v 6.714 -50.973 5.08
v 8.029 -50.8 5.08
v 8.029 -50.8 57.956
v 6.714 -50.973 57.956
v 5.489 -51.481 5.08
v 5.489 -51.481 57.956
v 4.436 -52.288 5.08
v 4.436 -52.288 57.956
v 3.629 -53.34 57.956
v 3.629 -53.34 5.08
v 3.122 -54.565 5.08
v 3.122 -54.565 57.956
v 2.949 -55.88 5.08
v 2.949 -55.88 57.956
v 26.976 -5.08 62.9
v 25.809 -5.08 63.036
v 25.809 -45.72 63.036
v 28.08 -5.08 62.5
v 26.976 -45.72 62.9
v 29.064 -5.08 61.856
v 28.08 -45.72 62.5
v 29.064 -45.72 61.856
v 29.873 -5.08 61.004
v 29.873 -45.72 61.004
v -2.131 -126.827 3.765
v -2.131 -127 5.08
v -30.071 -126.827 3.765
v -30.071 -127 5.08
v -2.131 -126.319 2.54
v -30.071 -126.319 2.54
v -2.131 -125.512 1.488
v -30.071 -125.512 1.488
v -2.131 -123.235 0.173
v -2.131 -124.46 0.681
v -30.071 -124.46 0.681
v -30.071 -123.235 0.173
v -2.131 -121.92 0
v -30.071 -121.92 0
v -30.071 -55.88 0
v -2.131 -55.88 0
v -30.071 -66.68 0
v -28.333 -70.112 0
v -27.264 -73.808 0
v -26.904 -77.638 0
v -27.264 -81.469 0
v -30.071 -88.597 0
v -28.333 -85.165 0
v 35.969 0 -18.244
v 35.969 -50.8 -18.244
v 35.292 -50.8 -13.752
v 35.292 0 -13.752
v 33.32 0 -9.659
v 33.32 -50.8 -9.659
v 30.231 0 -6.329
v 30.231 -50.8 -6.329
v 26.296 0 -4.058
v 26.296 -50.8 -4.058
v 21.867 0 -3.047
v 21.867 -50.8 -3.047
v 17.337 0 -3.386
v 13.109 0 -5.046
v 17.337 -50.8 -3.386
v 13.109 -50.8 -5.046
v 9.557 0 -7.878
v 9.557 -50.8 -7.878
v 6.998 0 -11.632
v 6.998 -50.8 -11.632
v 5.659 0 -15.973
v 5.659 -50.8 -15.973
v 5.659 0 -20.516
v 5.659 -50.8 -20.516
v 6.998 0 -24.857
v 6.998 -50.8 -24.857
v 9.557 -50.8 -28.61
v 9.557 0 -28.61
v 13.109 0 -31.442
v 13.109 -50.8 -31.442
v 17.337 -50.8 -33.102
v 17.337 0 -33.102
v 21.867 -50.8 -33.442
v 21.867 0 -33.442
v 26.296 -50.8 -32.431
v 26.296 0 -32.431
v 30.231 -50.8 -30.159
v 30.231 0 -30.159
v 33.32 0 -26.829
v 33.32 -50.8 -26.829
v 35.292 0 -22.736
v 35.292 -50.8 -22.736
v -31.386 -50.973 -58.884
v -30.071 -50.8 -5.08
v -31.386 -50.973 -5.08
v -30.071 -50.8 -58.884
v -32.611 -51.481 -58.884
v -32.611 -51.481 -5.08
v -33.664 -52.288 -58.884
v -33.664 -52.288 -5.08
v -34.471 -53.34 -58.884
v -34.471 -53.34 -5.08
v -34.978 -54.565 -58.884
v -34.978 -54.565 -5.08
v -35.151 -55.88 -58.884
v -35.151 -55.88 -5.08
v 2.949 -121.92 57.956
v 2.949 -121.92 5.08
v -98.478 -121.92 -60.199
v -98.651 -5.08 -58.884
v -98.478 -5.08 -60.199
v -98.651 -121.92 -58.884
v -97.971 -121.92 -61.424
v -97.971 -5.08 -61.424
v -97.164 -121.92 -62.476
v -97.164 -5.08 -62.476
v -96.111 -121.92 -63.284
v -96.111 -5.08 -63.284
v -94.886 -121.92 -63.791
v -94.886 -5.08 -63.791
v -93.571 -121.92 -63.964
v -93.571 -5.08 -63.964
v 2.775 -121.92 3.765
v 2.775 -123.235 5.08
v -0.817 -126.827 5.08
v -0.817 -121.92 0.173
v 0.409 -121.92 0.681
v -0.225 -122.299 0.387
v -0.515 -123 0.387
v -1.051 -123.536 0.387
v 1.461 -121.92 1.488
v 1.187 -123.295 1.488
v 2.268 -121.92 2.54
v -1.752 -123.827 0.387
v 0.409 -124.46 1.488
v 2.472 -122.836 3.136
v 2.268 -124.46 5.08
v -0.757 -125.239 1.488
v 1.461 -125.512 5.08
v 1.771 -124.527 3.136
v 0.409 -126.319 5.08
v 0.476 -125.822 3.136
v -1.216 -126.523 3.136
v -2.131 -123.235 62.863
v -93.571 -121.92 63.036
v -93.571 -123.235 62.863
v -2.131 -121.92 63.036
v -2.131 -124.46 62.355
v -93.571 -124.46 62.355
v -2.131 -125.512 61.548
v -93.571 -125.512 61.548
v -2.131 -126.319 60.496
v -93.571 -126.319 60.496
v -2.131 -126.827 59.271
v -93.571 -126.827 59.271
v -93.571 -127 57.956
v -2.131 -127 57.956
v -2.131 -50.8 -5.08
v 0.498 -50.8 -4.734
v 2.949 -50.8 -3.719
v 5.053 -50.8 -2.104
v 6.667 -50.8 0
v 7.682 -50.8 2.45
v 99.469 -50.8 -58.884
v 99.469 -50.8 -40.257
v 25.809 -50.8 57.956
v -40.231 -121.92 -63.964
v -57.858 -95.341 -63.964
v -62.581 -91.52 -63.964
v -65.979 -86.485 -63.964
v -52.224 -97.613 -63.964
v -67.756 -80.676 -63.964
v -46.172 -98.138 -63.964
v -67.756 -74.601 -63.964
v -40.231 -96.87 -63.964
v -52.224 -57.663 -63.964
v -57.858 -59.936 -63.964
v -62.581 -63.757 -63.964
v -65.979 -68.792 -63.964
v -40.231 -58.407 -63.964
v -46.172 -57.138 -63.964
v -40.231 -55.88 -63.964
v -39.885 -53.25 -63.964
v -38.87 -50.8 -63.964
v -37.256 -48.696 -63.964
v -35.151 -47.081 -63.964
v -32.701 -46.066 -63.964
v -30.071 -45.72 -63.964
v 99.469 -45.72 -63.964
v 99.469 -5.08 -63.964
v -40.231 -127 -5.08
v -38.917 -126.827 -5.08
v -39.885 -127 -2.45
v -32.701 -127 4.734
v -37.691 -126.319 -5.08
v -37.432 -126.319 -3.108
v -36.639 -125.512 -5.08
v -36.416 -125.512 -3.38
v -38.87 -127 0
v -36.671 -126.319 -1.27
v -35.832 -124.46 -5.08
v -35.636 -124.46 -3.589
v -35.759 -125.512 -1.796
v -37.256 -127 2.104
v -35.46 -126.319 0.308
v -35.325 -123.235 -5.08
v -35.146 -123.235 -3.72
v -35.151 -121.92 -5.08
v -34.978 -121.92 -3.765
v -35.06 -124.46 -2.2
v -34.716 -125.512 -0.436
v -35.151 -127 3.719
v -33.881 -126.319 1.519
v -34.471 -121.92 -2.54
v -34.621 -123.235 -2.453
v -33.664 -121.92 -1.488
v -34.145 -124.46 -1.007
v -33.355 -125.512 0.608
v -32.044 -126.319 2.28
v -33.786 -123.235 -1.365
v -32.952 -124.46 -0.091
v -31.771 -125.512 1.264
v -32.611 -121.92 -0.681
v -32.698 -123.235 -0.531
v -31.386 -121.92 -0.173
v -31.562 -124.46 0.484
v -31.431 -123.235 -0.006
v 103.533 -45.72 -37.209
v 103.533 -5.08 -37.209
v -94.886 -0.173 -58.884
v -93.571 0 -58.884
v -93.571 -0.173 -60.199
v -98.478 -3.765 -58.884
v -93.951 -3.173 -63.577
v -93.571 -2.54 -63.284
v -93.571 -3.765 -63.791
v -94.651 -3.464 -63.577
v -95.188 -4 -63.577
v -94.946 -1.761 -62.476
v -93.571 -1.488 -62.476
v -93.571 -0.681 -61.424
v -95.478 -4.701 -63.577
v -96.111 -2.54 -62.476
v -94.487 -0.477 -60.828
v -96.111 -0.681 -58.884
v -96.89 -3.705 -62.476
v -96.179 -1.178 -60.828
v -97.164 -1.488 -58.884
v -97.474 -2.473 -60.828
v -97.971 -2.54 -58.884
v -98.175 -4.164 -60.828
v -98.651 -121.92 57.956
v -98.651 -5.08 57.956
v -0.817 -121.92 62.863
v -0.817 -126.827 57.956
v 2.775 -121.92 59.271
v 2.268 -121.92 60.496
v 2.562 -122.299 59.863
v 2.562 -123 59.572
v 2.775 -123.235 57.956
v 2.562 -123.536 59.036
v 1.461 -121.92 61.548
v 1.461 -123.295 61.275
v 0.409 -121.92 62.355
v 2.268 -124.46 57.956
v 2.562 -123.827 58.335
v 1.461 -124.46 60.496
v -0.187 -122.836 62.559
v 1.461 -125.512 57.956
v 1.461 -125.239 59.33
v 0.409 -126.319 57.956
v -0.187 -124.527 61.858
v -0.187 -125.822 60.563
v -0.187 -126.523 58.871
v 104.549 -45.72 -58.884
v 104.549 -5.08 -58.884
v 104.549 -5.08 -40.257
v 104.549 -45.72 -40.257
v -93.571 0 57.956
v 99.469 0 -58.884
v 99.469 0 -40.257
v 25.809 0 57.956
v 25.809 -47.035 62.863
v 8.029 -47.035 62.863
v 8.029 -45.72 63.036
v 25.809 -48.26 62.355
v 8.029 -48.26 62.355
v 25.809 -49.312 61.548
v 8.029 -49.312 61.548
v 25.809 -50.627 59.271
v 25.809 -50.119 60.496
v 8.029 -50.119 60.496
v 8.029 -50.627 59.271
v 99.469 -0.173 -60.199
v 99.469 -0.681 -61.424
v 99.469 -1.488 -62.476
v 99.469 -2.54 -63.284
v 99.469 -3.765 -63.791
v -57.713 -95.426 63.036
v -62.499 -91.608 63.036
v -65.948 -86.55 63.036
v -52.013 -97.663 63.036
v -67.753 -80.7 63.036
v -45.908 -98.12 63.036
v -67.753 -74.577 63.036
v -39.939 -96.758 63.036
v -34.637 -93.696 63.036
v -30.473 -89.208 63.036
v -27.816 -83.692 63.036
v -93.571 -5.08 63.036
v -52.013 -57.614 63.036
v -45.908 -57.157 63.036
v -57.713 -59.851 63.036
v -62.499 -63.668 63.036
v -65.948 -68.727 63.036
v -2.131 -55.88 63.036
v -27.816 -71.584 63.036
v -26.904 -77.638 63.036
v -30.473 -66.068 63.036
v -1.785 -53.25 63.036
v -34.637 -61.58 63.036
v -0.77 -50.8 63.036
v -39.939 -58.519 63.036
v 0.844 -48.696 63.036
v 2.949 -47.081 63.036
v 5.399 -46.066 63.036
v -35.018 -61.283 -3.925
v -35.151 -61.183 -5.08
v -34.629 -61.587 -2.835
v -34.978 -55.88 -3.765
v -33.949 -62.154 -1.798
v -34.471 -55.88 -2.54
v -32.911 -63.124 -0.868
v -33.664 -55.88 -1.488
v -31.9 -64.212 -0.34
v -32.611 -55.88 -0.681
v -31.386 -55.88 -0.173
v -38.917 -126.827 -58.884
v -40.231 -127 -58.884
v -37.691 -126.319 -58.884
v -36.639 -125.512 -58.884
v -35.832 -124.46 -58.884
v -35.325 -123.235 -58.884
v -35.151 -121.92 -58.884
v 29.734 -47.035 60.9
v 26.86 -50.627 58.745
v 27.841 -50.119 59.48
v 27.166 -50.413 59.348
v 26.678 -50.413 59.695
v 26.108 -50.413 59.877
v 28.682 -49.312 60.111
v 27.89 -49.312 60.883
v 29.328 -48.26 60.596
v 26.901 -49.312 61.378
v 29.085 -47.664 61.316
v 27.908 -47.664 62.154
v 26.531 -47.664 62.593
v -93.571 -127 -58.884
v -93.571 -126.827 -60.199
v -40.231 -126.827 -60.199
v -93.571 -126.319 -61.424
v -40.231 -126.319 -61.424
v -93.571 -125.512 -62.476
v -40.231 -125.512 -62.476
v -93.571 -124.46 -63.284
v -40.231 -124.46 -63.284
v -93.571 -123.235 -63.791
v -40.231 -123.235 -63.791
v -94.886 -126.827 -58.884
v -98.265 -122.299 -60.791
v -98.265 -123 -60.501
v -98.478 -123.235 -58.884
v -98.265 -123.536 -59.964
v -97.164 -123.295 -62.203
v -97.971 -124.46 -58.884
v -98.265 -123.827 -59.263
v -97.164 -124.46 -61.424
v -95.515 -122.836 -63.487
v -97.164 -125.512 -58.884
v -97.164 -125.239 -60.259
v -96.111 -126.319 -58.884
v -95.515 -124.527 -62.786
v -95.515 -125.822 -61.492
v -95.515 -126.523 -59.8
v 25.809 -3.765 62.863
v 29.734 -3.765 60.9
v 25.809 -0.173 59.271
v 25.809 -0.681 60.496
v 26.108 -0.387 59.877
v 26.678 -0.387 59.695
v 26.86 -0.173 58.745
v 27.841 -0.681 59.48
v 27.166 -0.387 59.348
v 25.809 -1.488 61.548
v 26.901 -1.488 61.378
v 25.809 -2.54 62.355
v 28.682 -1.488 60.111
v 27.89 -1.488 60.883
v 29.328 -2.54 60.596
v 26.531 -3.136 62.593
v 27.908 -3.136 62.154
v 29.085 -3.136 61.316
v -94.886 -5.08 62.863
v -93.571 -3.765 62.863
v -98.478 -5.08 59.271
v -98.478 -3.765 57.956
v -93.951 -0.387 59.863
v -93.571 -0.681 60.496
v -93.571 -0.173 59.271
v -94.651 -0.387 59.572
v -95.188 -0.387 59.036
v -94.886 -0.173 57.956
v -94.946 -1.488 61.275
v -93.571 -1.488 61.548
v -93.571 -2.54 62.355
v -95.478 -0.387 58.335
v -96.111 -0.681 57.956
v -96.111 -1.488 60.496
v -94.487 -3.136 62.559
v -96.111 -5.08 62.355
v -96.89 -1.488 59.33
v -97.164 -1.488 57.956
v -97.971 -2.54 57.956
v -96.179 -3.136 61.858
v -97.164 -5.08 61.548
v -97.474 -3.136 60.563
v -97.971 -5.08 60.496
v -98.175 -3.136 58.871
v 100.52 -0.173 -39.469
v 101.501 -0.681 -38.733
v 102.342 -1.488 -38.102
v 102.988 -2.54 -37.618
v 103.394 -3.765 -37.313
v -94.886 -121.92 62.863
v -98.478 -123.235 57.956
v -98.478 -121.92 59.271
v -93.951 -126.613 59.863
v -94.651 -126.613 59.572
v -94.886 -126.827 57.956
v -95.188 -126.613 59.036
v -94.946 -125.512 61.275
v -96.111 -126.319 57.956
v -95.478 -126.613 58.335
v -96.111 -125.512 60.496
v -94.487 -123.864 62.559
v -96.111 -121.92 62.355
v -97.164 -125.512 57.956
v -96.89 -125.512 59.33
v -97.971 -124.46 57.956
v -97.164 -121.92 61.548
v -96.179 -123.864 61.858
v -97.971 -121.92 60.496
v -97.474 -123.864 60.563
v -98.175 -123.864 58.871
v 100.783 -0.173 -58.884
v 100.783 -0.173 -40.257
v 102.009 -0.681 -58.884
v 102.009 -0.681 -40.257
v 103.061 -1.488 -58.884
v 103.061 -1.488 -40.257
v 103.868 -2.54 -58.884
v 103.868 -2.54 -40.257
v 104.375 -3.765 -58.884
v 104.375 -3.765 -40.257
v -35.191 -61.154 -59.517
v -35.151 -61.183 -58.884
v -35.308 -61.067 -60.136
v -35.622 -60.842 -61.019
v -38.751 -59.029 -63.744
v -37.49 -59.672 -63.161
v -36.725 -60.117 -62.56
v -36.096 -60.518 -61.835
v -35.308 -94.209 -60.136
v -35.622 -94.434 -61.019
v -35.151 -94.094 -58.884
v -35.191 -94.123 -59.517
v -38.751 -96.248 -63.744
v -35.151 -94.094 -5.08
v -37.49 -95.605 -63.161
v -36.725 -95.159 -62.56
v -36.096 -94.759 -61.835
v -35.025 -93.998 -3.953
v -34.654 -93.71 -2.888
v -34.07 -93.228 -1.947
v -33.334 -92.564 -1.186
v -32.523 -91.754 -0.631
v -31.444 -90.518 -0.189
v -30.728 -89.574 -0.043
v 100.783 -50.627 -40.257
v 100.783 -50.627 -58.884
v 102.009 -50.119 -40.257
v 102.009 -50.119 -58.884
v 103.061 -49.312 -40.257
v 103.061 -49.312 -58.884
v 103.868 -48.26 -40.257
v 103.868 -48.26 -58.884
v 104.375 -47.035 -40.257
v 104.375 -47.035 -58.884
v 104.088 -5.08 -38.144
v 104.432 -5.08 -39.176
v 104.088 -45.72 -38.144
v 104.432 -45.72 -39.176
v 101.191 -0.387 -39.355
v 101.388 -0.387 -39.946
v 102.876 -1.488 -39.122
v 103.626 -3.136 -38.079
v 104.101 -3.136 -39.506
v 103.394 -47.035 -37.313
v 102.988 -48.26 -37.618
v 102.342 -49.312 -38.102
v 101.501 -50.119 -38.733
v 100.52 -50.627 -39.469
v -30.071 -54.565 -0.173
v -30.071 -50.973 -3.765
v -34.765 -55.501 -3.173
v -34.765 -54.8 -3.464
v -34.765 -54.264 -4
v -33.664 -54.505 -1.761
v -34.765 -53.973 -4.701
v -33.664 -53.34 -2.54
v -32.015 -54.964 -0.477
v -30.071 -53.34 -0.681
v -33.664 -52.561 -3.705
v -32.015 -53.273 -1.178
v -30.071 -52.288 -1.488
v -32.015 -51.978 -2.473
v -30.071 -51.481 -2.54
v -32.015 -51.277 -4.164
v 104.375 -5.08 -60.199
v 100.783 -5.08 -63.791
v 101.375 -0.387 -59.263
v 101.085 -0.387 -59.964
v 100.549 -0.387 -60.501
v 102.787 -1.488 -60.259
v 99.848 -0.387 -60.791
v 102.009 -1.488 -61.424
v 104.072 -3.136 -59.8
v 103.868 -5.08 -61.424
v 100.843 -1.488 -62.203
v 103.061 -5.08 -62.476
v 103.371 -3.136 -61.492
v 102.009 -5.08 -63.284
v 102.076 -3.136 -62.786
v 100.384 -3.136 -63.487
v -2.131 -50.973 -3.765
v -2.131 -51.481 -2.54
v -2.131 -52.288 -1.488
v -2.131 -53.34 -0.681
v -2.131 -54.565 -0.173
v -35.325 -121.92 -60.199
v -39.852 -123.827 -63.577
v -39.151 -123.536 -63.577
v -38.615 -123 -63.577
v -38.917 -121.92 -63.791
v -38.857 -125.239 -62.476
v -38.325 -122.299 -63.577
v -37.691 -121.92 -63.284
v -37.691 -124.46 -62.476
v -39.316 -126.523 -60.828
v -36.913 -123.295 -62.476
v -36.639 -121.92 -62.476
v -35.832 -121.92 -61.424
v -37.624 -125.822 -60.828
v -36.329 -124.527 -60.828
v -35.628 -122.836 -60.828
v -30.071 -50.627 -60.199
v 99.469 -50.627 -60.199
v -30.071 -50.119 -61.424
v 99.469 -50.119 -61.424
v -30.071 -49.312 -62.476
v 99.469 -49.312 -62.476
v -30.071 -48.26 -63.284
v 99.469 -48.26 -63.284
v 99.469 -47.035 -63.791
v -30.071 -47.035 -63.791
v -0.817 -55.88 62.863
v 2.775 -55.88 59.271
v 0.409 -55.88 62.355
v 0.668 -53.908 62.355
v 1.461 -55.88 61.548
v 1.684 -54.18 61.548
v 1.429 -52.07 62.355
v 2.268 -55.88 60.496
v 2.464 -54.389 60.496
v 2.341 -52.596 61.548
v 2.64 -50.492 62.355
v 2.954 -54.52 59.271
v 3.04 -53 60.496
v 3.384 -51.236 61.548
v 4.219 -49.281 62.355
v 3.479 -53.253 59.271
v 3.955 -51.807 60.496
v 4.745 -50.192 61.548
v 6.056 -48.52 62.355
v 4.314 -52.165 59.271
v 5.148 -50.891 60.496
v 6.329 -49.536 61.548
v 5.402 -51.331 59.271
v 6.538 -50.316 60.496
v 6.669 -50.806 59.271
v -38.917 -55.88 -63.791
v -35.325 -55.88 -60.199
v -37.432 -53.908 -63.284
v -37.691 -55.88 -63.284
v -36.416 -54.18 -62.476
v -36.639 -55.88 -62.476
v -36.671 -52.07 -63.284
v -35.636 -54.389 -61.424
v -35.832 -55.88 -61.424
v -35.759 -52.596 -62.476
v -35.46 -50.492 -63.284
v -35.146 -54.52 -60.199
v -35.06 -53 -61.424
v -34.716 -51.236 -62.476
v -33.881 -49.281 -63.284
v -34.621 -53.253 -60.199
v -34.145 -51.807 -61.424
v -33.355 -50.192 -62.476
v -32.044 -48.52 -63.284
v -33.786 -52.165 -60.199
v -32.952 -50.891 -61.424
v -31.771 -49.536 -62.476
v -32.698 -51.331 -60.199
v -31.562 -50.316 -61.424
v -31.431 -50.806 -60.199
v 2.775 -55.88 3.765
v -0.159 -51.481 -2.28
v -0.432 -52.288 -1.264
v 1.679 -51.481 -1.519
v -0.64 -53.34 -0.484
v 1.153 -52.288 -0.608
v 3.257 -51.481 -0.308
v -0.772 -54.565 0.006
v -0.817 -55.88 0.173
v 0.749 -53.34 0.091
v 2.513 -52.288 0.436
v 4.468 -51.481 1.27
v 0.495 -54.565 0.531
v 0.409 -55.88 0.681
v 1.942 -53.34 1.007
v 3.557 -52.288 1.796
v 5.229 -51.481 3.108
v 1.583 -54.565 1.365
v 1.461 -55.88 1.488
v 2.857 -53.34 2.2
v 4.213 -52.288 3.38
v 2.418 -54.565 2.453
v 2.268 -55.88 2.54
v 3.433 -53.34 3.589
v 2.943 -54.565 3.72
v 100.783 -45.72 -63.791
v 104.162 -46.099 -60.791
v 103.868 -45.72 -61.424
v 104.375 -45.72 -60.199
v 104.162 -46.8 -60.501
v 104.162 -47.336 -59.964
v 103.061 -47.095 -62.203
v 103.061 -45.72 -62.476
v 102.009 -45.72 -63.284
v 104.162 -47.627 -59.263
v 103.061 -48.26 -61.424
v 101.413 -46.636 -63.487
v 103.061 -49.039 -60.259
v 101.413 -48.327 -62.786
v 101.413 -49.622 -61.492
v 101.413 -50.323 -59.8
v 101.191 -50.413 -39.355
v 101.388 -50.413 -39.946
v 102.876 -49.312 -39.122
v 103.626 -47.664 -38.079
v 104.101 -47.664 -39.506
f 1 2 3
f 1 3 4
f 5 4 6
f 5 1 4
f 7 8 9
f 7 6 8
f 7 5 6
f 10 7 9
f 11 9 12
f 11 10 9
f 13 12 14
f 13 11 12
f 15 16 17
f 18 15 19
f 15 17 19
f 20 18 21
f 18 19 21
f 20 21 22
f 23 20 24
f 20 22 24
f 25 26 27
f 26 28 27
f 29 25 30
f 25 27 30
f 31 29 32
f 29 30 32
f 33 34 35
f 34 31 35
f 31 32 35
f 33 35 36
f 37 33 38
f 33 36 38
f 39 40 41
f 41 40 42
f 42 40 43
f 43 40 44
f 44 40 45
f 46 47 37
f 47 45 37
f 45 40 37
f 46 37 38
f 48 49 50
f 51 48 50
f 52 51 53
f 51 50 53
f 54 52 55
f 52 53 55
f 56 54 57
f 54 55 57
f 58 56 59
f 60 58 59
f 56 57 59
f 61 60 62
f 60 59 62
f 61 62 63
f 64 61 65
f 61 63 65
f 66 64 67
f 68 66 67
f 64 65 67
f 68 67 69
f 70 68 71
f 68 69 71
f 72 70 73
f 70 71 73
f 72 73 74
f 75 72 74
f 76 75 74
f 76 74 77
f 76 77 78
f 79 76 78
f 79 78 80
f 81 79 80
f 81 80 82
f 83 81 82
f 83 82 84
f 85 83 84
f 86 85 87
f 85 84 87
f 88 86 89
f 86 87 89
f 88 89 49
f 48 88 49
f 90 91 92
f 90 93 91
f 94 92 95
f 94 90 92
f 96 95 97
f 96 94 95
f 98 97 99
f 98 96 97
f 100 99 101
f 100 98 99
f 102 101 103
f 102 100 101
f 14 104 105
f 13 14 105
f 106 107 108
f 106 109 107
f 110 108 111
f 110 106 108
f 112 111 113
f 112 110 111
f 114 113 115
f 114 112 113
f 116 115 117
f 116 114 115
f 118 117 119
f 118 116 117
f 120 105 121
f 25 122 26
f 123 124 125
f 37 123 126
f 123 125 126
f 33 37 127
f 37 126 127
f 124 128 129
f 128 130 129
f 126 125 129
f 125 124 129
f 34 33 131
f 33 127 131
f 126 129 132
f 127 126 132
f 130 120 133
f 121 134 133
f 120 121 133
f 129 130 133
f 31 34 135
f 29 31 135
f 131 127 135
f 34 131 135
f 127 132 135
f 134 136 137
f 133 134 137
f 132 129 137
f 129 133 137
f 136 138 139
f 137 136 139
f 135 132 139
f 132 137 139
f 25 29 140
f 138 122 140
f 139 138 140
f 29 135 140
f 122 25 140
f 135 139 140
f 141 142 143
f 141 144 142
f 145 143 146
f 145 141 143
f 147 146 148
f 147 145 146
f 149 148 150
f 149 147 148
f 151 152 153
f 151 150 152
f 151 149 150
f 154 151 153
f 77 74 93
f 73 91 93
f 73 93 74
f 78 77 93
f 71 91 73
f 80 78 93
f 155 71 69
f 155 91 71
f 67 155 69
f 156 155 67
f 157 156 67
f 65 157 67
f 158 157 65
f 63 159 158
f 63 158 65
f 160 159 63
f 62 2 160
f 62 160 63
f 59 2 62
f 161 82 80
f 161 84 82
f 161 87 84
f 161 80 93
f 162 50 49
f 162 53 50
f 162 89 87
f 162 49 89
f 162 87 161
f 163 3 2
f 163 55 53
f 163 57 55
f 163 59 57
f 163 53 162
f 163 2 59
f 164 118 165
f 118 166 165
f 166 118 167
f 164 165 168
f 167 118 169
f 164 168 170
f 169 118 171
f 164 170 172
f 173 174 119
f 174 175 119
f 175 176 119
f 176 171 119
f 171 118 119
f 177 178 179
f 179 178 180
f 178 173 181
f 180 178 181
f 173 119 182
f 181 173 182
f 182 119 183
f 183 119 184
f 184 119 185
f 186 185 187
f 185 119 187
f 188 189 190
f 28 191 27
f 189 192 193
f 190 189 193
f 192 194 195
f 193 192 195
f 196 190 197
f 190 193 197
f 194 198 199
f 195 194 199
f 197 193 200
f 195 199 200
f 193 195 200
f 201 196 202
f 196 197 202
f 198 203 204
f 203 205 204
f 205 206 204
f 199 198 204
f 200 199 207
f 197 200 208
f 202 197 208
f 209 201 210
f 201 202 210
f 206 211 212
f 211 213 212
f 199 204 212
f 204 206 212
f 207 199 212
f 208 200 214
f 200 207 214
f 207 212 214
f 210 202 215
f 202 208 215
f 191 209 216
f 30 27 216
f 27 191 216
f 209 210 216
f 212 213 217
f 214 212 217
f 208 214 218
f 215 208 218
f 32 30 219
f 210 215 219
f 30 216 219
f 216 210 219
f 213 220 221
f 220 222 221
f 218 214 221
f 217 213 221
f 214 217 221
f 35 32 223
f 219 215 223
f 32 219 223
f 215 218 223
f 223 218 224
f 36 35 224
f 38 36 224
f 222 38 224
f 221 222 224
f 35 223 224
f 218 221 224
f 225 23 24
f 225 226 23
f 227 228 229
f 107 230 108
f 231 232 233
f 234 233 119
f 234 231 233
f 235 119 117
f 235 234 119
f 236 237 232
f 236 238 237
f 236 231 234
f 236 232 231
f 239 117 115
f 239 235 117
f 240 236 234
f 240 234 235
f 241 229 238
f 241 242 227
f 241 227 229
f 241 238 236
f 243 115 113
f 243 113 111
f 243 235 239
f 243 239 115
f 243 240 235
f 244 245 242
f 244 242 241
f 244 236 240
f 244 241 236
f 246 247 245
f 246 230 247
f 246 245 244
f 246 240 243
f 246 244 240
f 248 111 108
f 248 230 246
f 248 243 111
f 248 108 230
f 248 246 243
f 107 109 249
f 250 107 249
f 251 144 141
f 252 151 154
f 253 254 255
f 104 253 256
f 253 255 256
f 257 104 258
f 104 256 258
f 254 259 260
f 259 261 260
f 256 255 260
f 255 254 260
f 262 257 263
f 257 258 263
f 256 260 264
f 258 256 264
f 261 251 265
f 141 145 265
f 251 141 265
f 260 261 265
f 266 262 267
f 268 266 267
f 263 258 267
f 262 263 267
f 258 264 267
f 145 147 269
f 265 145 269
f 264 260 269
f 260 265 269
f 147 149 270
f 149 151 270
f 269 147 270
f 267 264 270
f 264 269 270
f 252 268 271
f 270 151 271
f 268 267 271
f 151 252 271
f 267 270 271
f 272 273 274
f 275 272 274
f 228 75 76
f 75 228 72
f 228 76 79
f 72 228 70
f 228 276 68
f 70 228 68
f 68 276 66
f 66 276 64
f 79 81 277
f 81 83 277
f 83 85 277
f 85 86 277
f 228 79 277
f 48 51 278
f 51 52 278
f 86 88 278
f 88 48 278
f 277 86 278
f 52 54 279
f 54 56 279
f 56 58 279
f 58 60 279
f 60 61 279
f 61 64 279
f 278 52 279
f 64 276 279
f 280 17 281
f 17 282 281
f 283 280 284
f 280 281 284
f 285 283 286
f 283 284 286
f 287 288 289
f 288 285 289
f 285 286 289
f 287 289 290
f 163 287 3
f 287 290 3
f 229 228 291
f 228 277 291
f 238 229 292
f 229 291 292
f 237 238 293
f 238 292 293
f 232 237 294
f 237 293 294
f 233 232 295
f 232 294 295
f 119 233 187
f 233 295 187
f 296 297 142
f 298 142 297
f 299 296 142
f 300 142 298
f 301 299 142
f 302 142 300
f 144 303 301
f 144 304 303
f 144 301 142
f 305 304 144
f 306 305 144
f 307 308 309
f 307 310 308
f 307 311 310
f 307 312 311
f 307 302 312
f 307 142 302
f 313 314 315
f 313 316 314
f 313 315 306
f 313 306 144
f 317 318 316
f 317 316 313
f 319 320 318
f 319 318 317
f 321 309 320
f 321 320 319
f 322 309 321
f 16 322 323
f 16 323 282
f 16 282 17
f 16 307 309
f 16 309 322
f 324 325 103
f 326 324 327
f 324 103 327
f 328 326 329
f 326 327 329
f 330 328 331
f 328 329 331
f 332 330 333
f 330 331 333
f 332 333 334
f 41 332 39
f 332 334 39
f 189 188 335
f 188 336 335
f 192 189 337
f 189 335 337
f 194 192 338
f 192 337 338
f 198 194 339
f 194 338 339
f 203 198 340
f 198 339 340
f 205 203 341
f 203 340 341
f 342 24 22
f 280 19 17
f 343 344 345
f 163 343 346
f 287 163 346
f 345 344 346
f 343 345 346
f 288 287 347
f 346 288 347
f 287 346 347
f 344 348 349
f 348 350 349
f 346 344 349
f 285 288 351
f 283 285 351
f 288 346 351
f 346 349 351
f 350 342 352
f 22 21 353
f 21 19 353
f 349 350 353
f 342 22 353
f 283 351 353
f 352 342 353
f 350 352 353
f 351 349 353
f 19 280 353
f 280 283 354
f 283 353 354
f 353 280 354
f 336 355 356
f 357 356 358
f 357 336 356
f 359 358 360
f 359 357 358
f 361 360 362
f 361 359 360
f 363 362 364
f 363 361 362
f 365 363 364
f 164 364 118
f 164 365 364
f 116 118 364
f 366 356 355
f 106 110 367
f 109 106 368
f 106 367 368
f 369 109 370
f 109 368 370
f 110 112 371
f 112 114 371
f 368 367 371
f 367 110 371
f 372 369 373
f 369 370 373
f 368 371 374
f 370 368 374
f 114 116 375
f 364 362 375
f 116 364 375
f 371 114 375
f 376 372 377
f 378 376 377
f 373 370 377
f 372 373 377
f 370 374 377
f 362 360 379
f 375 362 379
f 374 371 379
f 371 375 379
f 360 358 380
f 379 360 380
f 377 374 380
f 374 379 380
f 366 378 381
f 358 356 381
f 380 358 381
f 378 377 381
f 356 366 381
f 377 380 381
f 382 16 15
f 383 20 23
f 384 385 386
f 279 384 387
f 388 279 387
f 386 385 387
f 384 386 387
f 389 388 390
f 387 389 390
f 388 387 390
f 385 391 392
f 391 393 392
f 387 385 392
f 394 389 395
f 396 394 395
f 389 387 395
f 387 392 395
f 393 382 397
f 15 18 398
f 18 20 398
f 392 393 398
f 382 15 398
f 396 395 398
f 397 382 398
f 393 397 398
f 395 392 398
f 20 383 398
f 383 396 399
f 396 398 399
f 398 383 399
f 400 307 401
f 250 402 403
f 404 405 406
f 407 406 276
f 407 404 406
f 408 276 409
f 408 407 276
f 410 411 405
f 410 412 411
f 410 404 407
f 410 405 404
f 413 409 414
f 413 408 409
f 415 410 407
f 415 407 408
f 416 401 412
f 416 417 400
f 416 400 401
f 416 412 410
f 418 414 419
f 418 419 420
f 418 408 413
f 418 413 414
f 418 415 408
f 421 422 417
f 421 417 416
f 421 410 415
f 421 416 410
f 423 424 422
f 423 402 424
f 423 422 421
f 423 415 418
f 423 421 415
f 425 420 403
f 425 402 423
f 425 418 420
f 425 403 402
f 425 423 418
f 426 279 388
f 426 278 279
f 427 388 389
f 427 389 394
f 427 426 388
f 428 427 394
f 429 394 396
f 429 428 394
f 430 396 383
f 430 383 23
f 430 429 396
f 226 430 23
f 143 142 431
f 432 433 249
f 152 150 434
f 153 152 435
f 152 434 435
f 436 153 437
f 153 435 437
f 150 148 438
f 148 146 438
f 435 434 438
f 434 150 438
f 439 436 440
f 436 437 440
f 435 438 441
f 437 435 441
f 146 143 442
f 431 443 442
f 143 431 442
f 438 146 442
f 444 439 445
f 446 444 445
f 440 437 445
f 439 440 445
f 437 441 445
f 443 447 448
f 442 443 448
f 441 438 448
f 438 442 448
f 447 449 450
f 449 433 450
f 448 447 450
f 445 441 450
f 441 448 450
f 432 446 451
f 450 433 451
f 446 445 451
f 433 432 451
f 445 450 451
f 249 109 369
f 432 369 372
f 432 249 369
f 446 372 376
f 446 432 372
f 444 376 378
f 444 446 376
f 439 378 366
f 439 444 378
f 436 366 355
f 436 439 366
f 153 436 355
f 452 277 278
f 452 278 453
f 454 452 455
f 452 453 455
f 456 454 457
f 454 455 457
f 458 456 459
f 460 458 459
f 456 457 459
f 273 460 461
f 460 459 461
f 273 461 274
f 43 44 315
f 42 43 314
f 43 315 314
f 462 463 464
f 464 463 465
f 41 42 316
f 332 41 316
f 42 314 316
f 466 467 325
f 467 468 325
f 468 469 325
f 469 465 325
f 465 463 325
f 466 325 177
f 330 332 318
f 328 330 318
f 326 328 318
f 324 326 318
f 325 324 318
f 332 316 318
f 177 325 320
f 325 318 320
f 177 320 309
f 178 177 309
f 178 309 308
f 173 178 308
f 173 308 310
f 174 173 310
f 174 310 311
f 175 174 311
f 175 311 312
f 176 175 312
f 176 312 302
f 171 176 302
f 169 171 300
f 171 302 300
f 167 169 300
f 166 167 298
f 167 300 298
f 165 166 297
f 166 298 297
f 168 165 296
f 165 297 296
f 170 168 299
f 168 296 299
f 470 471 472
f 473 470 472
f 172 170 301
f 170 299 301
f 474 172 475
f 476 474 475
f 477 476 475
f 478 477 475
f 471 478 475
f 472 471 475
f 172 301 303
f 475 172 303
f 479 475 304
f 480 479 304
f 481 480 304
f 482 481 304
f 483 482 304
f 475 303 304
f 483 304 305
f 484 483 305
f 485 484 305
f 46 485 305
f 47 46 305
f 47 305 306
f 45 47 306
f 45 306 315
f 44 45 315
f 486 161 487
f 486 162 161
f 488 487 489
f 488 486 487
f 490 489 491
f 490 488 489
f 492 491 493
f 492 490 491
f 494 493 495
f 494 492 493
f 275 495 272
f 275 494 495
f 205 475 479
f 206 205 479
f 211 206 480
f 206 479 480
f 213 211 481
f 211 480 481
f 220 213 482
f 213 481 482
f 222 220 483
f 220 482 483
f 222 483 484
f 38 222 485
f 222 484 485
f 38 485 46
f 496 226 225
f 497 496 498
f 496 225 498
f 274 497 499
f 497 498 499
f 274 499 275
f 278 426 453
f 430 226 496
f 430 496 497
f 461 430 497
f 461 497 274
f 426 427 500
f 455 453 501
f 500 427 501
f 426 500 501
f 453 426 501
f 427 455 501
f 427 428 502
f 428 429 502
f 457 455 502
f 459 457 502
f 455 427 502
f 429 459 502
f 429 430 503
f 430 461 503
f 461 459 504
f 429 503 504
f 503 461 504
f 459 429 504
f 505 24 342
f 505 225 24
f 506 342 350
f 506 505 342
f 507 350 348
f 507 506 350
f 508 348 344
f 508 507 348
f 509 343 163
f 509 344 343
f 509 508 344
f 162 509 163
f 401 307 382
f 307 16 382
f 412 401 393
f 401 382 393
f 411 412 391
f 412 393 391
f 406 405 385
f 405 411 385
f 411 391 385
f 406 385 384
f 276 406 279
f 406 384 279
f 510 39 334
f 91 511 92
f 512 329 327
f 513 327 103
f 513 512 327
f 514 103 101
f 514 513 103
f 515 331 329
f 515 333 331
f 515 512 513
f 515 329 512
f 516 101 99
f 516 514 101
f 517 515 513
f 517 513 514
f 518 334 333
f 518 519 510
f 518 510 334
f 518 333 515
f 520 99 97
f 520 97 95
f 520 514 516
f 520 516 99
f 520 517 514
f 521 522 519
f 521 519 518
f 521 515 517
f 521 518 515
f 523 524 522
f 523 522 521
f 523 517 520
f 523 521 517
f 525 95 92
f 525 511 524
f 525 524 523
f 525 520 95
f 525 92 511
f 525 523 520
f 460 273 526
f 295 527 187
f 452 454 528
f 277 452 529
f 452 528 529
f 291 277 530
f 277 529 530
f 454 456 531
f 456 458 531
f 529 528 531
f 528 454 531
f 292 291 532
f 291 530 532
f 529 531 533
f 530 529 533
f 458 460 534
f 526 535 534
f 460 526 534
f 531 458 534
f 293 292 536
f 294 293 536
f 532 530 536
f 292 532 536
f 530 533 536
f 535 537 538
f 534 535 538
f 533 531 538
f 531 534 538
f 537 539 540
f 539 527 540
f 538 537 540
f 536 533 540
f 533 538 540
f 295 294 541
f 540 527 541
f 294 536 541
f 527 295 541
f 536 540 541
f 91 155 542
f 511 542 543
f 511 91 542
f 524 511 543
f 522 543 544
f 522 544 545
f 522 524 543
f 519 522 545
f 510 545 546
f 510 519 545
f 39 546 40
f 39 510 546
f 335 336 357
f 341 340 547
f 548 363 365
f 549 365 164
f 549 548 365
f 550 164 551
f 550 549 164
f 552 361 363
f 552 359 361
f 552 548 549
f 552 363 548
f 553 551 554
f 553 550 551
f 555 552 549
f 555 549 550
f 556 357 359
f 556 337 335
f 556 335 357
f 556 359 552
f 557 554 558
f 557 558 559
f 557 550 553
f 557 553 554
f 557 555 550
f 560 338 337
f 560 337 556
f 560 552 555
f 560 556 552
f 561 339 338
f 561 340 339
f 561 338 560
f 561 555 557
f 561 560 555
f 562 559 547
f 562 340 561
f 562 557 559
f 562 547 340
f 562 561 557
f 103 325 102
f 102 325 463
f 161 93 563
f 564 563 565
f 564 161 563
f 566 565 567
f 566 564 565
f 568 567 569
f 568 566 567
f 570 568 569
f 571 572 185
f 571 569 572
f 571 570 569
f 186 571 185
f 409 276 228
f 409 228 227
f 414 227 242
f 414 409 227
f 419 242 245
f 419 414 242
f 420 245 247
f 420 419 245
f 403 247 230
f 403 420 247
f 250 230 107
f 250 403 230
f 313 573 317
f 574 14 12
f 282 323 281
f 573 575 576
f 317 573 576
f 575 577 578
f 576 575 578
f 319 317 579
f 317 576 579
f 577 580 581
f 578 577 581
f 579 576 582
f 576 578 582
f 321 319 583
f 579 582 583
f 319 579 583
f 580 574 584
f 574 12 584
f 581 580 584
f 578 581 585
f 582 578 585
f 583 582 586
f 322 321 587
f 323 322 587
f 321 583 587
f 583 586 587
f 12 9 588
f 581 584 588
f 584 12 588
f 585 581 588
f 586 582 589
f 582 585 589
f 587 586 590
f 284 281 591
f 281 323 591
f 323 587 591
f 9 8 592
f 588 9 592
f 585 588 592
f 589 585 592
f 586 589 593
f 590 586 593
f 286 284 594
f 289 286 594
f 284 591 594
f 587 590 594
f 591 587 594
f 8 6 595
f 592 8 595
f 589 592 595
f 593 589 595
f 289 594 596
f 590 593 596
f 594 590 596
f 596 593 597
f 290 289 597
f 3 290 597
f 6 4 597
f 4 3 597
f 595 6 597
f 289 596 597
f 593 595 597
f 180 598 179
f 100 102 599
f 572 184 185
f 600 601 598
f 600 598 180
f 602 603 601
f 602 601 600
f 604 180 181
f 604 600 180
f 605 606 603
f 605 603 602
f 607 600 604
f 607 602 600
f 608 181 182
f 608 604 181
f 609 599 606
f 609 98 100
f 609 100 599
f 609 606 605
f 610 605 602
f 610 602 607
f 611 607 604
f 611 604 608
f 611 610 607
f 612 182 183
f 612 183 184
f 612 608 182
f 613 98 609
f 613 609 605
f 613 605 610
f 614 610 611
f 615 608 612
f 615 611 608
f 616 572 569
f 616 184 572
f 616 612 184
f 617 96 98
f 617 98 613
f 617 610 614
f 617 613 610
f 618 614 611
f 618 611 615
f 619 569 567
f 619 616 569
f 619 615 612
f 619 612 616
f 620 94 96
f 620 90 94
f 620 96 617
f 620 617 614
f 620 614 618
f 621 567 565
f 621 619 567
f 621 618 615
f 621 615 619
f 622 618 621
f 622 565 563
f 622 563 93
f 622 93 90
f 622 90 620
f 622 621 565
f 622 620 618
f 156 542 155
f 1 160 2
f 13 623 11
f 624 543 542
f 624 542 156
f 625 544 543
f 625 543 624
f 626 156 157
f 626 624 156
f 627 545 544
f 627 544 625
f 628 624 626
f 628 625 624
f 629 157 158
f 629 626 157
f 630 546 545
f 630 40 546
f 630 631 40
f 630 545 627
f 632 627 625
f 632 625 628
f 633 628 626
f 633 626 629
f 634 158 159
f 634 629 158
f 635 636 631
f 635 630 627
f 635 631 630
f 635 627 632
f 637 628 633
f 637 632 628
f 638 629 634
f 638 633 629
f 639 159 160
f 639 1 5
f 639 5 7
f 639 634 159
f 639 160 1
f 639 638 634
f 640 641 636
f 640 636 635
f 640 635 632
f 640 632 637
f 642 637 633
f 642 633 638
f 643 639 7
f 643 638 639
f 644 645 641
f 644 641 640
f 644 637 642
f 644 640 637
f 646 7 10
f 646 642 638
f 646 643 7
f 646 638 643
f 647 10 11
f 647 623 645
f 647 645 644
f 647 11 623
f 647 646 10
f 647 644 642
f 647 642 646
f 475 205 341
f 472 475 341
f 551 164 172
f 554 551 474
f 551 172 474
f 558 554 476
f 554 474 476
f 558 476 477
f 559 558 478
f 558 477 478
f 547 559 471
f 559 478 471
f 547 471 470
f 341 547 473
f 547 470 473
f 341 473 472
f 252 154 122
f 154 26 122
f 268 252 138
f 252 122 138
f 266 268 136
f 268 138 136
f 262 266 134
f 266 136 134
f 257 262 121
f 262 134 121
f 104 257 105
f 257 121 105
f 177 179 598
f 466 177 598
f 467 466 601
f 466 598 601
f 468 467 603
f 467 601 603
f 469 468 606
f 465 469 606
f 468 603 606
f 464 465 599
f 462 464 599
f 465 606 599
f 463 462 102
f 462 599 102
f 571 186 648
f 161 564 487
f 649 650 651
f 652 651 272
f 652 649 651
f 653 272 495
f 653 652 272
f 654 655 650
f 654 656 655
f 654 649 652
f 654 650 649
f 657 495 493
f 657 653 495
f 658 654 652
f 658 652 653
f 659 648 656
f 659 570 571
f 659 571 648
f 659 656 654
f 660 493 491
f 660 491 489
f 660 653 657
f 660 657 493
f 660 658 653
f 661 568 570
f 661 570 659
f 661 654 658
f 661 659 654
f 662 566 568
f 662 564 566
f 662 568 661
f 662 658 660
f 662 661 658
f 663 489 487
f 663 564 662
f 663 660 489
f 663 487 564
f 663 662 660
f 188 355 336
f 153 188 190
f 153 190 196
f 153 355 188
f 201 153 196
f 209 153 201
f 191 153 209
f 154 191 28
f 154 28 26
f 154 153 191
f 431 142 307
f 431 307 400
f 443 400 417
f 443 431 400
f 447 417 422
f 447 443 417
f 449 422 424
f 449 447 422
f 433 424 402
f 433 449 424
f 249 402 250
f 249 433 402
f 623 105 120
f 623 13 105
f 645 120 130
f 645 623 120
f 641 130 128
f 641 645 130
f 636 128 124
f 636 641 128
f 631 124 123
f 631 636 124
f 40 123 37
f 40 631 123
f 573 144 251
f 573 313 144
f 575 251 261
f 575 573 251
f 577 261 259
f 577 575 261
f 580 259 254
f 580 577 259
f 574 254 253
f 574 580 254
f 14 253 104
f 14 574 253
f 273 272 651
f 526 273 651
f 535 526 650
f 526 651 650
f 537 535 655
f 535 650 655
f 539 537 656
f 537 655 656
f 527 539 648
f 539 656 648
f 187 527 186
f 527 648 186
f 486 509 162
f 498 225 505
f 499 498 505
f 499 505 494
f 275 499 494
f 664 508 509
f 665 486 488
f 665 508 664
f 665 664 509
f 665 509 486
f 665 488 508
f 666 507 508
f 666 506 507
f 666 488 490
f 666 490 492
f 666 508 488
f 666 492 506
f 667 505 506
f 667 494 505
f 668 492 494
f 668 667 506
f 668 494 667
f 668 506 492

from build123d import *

# Parameters (mm, degrees)
F0_W     = 203.2
F0_H     = 127
F1_DEPTH = 127
F3_DEPTH = 76.2
F4_SIZE2 = 101.6
F4_SIZE  = 76.2
F5_R     = 5.08
F6_R     = 15.24
F7_DEPTH = 50.8
F8_R     = 20.5391892085
F9_DEPTH = 127


with BuildPart() as f1:
    # F0 (on Front) → F1 (new body)
    with BuildSketch(Plane.XZ):
        with Locations((2.9485966027, -0.464142194)):
            Rectangle(F0_W, F0_H)
    extrude(amount=F1_DEPTH)

    # F2 (on face) → F3 (cut)
    with BuildSketch(Plane.XZ.offset(127)):
        Polygon((-35.1514033973, 0), (-35.1514033973, -63.964142194), (104.5485966027, -63.964142194), (104.5485966027, 63.035857806), (2.9485966027, 63.035857806), (2.9485966027, 0), align=None)
    extrude(amount=-F3_DEPTH, mode=Mode.SUBTRACT)

    # F4
    f4_edges = [f1.edges().sort_by_distance(p)[0] for p in [
        (104.548597, -25.4, 63.035858),
    ]]
    f4_side = f1.faces().sort_by_distance((-18.822832, -52.614286, 63.035858))[0]
    chamfer(f4_edges, length=F4_SIZE, length2=F4_SIZE2, reference=f4_side)

    # F5
    f5_edges = [f1.edges().sort_by_distance(p)[0] for p in [
        (-98.651403, -63.5, 63.035858),
        (-47.851403, -127, 63.035858),
        (2.948597, -88.9, 63.035858),
        (15.648597, -50.8, 63.035858),
        (28.348597, -25.4, 63.035858),
        (-35.151403, 0, 63.035858),
        (2.948597, -127, 31.517929),
        (2.948597, -88.9, 0),
        (-35.151403, -127, -31.982071),
        (-16.101403, -127, 0),
        (-16.101403, -50.8, 0),
        (-35.151403, -88.9, 0),
        (-35.151403, -50.8, -31.982071),
        (-66.901403, -127, -63.964142),
        (-35.151403, -88.9, -63.964142),
        (34.698597, -50.8, -63.964142),
        (104.548597, -25.4, -63.964142),
        (104.548597, -50.8, -51.264142),
        (104.548597, 0, -51.264142),
        (104.548597, -25.4, -38.564142),
        (66.448597, 0, 12.235858),
        (66.448597, -50.8, 12.235858),
        (-98.651403, 0, -0.464142),
        (2.948597, 0, -63.964142),
        (-98.651403, -63.5, -63.964142),
        (-98.651403, -127, -0.464142),
        (2.948597, -50.8, 31.517929),
    ]]
    fillet(f5_edges, radius=F5_R)

    # F6 (on face) → F7 (cut, through all)
    with BuildSketch(Plane.XZ.offset(50.8)):
        with Locations((20.7285966027, -18.244142194)):
            Circle(F6_R)
    extrude(amount=-F7_DEPTH, mode=Mode.SUBTRACT)

    # F8 (on face) → F9 (cut, through all)
    with BuildSketch(Plane.XY.offset(63.035857806)):
        with Locations((-47.4430248141, -77.6382982731)):
            Circle(F8_R)
    extrude(amount=-F9_DEPTH, mode=Mode.SUBTRACT)


solid = f1.part
